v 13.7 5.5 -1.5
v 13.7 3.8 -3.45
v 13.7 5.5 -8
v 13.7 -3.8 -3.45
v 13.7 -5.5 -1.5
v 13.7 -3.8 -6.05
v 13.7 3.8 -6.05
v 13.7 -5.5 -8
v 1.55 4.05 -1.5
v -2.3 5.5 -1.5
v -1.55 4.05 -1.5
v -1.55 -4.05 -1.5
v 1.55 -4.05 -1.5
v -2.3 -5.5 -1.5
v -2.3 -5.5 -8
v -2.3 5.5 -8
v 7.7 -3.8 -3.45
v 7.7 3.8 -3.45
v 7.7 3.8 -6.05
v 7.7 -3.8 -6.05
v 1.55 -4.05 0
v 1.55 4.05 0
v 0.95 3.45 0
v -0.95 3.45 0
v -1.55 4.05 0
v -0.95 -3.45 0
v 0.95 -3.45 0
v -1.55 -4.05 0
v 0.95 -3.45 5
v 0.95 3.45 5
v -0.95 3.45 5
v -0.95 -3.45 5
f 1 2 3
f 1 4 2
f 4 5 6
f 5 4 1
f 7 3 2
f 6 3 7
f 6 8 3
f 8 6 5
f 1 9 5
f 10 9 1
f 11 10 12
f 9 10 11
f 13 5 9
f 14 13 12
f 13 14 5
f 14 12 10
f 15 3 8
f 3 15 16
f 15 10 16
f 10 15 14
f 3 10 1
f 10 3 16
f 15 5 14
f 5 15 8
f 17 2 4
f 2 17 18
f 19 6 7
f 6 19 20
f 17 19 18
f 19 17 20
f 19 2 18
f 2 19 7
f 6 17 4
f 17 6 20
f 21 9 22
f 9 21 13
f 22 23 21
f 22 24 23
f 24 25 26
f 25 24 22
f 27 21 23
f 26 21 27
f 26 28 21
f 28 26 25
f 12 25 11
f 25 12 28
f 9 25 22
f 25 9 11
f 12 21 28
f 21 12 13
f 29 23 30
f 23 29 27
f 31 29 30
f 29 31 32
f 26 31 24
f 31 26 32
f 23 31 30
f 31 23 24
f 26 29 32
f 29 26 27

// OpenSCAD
// ============================================================================
// micro-B の L 字アダプタ  オーディオファン「方向変換アダプター L字 B」 Amazon B0CTMHK3BY
//   2026-08-24 ユーザー発見・購入。PowerBoost の micro-B に挿し、90° 曲げて箱の内側へ出す。
//
//   📄 商品図: 16 × 13 × 11 mm・1 g。13 は金属プラグの先から胴の底まで（プラグ軸方向）。
//      16 は肘の方向の胴の長さ。11 は胴の幅（プラグの広い辺と同じ向き）。
//   🔒 **プラグは 5 mm 埋まり、口の面から出るのは 8 mm。確定（2026-08-24 ユーザー）。測り直さない。**
//   ⚠ 首と胴の厚みの内訳（1.5 ＋ 6.5）だけは絵の都合で、合計 8 は動かない。
//
//   ローカル座標:  原点 = レセプタクルの面（口の面）でのプラグ軸の中心
//      +Z … プラグ軸。+Z がレセプタクルの中（挿さる側）、−Z が外
//      +X … プラグの広い面（ツメのある面）が向く側 ＝ 胴が伸びる側（肘の向き）
//      ±Y … プラグの幅方向（胴の幅 11 もこの向き）
// ============================================================================
LA_PLUG_IN  = 5.0;          // 🔒 埋まる長さ（確定）
LA_PLUG_W   = 6.9;          // 📄 micro-B プラグの殻の幅（規格）
LA_PLUG_T   = 1.9;          // 📄 同・厚み（規格）
LA_TOTAL_H  = 13.0;         // 📄 商品図
LA_BODY_L   = 16.0;         // 📄 商品図（肘の方向）
LA_BODY_W   = 11.0;         // 📄 商品図（幅）
LA_OUT      = 8.0;          // 🔒 口の面から外へ出る長さ（確定）
LA_NECK     = 1.5;          // 絵の都合: プラグの根元の黒い首
LA_BODY_T   = LA_OUT - LA_NECK;                    // 6.5  胴の厚み（プラグ軸方向）
LA_TAIL     = 2.3;          // ⚠ 推定: プラグ軸から胴の端（壁側）までの出っ張り
LA_SOCK     = [7.6, 2.6];   // 📄 micro-B メスの開口（幅 × 高さ）

function la_body_box() = [[-LA_TAIL, -LA_BODY_W/2, -LA_NECK - LA_BODY_T], [LA_BODY_L - LA_TAIL, LA_BODY_W/2, -LA_NECK]];
function la_out_len()  = LA_NECK + LA_BODY_T;      // 口の面から外へ出る長さ 8.0
function la_reach()    = LA_BODY_L - LA_TAIL;      // 口の軸から肘の先（ソケットの面）まで 13.7

module usb_l_adapter_plug() {                      // レセプタクルに埋まる部分（当たり検査からは除く）
    color("#c8ccd0") translate([-LA_PLUG_T/2, -LA_PLUG_W/2, 0]) cube([LA_PLUG_T, LA_PLUG_W, LA_PLUG_IN]);
}
module usb_l_adapter_body() {                      // 口の面から外に出る部分（当たり検査はこれ）
    color("#2d3748") translate([-LA_PLUG_T/2 - 0.6, -LA_PLUG_W/2 - 0.6, -LA_NECK]) cube([LA_PLUG_T + 1.2, LA_PLUG_W + 1.2, LA_NECK]);   // 首
    b = la_body_box();
    color("#1a202c") difference() {
        translate(b[0]) cube(b[1] - b[0]);
        // 肘の先のソケット（開口は +X を向く）
        translate([b[1][0] - 6, -LA_SOCK[0]/2, b[0][2] + (LA_BODY_T - LA_SOCK[1])/2]) cube([6.01, LA_SOCK[0], LA_SOCK[1]]);
    }
}
module usb_l_adapter() { usb_l_adapter_plug(); usb_l_adapter_body(); }

// 肘の先に挿すストレートのプラグ（例: B0H5BRM1YG の micro-B 側）の予約。⚠ 頭の寸法は未取得・仮
LA_NEXT_HEAD = [10.0, 9.0, 5.5];                   // 長さ × 幅 × 厚み ⚠ 仮
module usb_l_adapter_next_plug() {
    b = la_body_box(); zc = b[0][2] + LA_BODY_T/2;
    color("#f6ad55", 0.5) translate([b[1][0], -LA_NEXT_HEAD[1]/2, zc - LA_NEXT_HEAD[2]/2]) cube(LA_NEXT_HEAD);
}

// 単体で見る
if ($preview || true) { usb_l_adapter(); %usb_l_adapter_next_plug(); }
